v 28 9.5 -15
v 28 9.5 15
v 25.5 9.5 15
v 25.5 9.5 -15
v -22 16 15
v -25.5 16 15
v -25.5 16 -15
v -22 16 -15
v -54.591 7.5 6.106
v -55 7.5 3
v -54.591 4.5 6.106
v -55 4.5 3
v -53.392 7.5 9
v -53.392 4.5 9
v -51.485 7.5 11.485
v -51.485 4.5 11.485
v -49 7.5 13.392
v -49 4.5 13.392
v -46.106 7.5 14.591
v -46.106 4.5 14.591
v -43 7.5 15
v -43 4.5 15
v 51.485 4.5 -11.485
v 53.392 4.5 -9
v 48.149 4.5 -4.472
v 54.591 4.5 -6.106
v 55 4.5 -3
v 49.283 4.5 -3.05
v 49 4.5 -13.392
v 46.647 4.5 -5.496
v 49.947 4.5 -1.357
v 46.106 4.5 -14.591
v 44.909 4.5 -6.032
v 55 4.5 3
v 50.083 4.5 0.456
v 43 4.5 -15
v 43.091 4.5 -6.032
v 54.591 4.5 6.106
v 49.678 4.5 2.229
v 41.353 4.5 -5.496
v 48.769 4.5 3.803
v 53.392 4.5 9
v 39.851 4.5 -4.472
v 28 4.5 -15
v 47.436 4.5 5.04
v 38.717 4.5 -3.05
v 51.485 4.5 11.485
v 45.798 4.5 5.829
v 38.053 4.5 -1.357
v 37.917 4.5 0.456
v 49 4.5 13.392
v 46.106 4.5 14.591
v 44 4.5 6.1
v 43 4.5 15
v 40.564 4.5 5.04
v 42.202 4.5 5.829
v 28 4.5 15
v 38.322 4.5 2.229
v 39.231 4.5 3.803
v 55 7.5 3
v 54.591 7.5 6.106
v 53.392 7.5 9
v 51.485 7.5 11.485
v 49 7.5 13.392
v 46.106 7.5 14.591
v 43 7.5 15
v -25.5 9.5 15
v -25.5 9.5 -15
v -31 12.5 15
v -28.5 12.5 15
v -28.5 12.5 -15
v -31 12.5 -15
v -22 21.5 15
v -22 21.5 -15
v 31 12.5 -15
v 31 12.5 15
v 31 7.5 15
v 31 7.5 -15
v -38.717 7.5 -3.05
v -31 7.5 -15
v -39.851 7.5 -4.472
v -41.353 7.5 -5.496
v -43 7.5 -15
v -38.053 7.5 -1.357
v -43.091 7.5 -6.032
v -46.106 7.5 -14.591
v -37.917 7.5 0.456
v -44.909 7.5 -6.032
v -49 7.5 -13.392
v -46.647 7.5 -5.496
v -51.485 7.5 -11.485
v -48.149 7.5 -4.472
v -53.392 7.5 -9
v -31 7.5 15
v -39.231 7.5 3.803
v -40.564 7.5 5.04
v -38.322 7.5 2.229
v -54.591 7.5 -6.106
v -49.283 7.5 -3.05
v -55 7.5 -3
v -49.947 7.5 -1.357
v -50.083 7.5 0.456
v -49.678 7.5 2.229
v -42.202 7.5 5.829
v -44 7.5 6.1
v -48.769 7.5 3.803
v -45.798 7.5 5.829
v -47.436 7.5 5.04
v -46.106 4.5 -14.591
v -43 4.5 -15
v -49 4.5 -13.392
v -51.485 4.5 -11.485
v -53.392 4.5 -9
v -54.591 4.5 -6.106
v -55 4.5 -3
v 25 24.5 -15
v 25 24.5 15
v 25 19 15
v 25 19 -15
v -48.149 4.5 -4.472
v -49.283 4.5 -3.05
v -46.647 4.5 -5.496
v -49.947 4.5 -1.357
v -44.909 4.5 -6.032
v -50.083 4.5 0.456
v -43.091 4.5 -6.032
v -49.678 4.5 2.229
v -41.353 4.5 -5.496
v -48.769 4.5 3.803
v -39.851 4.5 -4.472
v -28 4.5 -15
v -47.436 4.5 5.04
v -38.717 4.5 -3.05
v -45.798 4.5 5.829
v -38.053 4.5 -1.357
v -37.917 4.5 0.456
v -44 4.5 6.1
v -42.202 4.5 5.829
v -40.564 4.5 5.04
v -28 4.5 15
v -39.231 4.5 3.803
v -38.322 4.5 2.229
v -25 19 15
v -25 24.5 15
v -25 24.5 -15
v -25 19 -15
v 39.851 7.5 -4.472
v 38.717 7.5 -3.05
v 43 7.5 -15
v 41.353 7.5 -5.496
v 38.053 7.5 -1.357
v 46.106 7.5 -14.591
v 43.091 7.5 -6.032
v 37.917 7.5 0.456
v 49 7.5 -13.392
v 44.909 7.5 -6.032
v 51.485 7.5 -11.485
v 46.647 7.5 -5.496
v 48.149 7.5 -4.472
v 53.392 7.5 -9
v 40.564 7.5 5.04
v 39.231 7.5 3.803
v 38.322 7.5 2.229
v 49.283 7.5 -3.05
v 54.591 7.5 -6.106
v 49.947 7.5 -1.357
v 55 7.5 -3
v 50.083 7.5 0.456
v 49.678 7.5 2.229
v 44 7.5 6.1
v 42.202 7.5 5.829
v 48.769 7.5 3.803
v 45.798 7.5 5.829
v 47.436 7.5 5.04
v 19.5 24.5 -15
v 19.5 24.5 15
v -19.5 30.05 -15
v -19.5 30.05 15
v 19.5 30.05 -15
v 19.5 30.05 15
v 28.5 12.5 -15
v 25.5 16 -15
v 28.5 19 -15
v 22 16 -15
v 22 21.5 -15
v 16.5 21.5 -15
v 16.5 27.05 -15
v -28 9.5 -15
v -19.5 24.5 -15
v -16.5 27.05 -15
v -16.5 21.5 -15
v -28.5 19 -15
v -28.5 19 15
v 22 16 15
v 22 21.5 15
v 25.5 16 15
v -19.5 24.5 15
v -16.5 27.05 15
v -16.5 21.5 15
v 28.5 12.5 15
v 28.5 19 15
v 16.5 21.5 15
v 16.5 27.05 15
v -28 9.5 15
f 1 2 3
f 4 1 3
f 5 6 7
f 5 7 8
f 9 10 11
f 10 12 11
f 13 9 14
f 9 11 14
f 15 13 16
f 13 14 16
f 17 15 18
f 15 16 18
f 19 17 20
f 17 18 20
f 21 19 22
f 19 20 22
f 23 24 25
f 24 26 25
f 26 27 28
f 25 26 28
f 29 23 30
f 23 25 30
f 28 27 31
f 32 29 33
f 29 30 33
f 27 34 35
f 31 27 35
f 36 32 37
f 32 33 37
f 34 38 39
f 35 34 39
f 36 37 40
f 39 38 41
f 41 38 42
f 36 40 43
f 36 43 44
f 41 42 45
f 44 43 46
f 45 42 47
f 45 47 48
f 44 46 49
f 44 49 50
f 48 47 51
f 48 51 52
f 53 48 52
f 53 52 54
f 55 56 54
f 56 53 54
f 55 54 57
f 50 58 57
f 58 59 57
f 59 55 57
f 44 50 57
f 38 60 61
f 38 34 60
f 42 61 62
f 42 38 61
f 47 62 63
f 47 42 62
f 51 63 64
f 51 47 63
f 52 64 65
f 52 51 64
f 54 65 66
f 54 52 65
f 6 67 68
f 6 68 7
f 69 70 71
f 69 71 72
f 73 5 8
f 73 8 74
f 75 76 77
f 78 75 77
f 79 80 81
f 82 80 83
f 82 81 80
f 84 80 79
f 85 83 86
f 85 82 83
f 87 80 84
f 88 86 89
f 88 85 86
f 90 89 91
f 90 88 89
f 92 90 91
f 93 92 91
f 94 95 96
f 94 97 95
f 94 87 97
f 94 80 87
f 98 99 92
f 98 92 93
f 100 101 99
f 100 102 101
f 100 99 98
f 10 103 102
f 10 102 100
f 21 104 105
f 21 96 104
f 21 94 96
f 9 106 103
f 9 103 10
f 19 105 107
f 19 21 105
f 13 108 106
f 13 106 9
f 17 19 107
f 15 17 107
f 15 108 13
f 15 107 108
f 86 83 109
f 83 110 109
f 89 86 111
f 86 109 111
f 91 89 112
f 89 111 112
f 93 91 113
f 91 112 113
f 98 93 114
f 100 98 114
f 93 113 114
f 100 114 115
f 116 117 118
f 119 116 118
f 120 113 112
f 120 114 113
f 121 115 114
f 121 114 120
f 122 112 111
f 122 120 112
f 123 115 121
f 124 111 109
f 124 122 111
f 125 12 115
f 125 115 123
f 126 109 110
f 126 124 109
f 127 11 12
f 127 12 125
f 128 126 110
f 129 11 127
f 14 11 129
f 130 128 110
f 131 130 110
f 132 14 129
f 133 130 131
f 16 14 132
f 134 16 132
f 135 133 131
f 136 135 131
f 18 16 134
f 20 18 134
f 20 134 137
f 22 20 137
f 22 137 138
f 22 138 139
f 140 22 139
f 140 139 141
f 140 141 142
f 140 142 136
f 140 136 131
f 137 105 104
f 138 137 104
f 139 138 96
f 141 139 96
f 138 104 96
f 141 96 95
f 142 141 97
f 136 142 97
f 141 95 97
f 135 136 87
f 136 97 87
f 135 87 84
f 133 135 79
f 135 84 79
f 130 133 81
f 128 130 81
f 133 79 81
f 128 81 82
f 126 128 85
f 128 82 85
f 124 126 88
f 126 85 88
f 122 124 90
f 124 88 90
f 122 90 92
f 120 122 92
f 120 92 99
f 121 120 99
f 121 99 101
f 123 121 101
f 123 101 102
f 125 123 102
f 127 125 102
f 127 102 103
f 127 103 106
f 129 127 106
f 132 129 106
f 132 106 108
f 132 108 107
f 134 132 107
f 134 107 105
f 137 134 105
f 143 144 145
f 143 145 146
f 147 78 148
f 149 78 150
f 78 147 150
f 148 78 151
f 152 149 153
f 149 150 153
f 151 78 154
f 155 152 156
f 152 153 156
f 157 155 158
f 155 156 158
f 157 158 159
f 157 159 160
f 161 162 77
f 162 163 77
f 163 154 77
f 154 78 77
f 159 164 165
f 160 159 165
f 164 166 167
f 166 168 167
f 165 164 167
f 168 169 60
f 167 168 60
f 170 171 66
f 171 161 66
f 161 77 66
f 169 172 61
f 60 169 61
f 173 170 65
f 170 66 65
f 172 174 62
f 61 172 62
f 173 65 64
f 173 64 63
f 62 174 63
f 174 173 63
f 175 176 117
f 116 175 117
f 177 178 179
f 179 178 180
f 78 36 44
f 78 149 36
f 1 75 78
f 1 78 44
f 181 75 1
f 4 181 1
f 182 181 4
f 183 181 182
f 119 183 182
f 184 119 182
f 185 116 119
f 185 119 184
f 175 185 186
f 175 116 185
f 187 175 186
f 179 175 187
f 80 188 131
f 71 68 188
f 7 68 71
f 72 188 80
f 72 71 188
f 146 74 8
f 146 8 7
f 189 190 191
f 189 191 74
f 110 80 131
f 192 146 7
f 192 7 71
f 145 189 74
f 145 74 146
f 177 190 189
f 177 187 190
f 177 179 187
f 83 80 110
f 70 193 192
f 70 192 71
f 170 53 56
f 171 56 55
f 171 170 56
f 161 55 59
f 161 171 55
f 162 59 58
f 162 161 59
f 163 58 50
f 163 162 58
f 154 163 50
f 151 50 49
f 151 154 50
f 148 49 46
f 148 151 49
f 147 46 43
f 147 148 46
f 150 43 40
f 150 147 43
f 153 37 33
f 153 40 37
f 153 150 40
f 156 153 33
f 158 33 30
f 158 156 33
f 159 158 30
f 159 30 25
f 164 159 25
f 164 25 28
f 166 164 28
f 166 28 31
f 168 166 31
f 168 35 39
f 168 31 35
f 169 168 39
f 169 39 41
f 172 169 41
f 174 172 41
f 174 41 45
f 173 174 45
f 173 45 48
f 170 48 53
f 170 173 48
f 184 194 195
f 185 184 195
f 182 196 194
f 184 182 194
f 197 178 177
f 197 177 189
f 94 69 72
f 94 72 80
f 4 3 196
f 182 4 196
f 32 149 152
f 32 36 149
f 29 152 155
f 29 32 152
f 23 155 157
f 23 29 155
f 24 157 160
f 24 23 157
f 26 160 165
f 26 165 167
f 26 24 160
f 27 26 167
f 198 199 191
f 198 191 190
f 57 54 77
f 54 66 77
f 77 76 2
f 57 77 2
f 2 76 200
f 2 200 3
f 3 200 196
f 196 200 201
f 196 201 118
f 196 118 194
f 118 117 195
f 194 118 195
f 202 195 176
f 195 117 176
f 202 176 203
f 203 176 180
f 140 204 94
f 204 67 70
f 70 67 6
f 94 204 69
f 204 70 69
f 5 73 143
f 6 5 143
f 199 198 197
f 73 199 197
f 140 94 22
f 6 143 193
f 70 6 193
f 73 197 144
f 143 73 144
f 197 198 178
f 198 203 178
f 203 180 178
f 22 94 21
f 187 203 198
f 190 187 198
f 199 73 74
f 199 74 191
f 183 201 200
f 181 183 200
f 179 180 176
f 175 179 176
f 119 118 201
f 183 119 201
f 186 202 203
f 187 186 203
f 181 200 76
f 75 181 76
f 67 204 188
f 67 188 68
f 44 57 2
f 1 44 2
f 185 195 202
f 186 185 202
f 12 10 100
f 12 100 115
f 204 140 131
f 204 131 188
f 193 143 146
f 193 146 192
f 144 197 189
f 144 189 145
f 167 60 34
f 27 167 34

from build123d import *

# Parameters (mm, degrees)
EXTRUDE_THIN1_DEPTH  = 15
SKETCH2_R            = 6.1
CUT_EXTRUDE1_DEPTH   = 62.306626885
FILLET1_R            = 12
FILLET1_OF_MIRROR1_R = 12


with BuildPart() as part:
    # Sketch1 → Extrude-Thin1 (new, symmetric)
    with BuildSketch(Plane.XY):
        Polygon((-55, 4.5), (-28, 4.5), (-28, 9.5), (-25.5, 9.5), (-25.5, 16), (-22, 16), (-22, 21.5), (-16.5, 21.5), (-16.5, 27.05), (0, 27.05), (0, 30.05), (-19.5, 30.05), (-19.5, 24.5), (-25, 24.5), (-25, 19), (-28.5, 19), (-28.5, 12.5), (-31, 12.5), (-31, 7.5), (-55, 7.5), align=None)
    extrude_thin1 = extrude(amount=EXTRUDE_THIN1_DEPTH, both=True)

    # Sketch2 → Cut-Extrude1 (cut, through all)
    with BuildSketch(Plane(origin=(0, 7.5, 0), x_dir=(1, 0, 0), z_dir=(0, 1, 0))):
        with Locations(Location((-44, 0, 0), (0, 0, 270))):
            Circle(SKETCH2_R)
    cut_extrude1 = extrude(amount=-CUT_EXTRUDE1_DEPTH, mode=Mode.SUBTRACT)

    # Fillet1
    fillet1_edges = [part.edges().sort_by_distance(p)[0] for p in [
        (-55, 6, -15),
        (-55, 6, 15),
    ]]
    fillet(fillet1_edges, radius=FILLET1_R)

    # Mirror1: Extrude-Thin1, Cut-Extrude1 across plane
    add(extrude_thin1.mirror(Plane(origin=(0, 30.05, 15), x_dir=(0, 0, 1), z_dir=(1, 0, 0))))
    add(cut_extrude1.mirror(Plane(origin=(0, 30.05, 15), x_dir=(0, 0, 1), z_dir=(1, 0, 0))), mode=Mode.SUBTRACT)

    # Fillet1 of Mirror1
    fillet1_of_mirror1_edges = [part.edges().sort_by_distance(p)[0] for p in [
        (55, 6, -15),
        (55, 6, 15),
    ]]
    fillet(fillet1_of_mirror1_edges, radius=FILLET1_OF_MIRROR1_R)


solid = part.part
